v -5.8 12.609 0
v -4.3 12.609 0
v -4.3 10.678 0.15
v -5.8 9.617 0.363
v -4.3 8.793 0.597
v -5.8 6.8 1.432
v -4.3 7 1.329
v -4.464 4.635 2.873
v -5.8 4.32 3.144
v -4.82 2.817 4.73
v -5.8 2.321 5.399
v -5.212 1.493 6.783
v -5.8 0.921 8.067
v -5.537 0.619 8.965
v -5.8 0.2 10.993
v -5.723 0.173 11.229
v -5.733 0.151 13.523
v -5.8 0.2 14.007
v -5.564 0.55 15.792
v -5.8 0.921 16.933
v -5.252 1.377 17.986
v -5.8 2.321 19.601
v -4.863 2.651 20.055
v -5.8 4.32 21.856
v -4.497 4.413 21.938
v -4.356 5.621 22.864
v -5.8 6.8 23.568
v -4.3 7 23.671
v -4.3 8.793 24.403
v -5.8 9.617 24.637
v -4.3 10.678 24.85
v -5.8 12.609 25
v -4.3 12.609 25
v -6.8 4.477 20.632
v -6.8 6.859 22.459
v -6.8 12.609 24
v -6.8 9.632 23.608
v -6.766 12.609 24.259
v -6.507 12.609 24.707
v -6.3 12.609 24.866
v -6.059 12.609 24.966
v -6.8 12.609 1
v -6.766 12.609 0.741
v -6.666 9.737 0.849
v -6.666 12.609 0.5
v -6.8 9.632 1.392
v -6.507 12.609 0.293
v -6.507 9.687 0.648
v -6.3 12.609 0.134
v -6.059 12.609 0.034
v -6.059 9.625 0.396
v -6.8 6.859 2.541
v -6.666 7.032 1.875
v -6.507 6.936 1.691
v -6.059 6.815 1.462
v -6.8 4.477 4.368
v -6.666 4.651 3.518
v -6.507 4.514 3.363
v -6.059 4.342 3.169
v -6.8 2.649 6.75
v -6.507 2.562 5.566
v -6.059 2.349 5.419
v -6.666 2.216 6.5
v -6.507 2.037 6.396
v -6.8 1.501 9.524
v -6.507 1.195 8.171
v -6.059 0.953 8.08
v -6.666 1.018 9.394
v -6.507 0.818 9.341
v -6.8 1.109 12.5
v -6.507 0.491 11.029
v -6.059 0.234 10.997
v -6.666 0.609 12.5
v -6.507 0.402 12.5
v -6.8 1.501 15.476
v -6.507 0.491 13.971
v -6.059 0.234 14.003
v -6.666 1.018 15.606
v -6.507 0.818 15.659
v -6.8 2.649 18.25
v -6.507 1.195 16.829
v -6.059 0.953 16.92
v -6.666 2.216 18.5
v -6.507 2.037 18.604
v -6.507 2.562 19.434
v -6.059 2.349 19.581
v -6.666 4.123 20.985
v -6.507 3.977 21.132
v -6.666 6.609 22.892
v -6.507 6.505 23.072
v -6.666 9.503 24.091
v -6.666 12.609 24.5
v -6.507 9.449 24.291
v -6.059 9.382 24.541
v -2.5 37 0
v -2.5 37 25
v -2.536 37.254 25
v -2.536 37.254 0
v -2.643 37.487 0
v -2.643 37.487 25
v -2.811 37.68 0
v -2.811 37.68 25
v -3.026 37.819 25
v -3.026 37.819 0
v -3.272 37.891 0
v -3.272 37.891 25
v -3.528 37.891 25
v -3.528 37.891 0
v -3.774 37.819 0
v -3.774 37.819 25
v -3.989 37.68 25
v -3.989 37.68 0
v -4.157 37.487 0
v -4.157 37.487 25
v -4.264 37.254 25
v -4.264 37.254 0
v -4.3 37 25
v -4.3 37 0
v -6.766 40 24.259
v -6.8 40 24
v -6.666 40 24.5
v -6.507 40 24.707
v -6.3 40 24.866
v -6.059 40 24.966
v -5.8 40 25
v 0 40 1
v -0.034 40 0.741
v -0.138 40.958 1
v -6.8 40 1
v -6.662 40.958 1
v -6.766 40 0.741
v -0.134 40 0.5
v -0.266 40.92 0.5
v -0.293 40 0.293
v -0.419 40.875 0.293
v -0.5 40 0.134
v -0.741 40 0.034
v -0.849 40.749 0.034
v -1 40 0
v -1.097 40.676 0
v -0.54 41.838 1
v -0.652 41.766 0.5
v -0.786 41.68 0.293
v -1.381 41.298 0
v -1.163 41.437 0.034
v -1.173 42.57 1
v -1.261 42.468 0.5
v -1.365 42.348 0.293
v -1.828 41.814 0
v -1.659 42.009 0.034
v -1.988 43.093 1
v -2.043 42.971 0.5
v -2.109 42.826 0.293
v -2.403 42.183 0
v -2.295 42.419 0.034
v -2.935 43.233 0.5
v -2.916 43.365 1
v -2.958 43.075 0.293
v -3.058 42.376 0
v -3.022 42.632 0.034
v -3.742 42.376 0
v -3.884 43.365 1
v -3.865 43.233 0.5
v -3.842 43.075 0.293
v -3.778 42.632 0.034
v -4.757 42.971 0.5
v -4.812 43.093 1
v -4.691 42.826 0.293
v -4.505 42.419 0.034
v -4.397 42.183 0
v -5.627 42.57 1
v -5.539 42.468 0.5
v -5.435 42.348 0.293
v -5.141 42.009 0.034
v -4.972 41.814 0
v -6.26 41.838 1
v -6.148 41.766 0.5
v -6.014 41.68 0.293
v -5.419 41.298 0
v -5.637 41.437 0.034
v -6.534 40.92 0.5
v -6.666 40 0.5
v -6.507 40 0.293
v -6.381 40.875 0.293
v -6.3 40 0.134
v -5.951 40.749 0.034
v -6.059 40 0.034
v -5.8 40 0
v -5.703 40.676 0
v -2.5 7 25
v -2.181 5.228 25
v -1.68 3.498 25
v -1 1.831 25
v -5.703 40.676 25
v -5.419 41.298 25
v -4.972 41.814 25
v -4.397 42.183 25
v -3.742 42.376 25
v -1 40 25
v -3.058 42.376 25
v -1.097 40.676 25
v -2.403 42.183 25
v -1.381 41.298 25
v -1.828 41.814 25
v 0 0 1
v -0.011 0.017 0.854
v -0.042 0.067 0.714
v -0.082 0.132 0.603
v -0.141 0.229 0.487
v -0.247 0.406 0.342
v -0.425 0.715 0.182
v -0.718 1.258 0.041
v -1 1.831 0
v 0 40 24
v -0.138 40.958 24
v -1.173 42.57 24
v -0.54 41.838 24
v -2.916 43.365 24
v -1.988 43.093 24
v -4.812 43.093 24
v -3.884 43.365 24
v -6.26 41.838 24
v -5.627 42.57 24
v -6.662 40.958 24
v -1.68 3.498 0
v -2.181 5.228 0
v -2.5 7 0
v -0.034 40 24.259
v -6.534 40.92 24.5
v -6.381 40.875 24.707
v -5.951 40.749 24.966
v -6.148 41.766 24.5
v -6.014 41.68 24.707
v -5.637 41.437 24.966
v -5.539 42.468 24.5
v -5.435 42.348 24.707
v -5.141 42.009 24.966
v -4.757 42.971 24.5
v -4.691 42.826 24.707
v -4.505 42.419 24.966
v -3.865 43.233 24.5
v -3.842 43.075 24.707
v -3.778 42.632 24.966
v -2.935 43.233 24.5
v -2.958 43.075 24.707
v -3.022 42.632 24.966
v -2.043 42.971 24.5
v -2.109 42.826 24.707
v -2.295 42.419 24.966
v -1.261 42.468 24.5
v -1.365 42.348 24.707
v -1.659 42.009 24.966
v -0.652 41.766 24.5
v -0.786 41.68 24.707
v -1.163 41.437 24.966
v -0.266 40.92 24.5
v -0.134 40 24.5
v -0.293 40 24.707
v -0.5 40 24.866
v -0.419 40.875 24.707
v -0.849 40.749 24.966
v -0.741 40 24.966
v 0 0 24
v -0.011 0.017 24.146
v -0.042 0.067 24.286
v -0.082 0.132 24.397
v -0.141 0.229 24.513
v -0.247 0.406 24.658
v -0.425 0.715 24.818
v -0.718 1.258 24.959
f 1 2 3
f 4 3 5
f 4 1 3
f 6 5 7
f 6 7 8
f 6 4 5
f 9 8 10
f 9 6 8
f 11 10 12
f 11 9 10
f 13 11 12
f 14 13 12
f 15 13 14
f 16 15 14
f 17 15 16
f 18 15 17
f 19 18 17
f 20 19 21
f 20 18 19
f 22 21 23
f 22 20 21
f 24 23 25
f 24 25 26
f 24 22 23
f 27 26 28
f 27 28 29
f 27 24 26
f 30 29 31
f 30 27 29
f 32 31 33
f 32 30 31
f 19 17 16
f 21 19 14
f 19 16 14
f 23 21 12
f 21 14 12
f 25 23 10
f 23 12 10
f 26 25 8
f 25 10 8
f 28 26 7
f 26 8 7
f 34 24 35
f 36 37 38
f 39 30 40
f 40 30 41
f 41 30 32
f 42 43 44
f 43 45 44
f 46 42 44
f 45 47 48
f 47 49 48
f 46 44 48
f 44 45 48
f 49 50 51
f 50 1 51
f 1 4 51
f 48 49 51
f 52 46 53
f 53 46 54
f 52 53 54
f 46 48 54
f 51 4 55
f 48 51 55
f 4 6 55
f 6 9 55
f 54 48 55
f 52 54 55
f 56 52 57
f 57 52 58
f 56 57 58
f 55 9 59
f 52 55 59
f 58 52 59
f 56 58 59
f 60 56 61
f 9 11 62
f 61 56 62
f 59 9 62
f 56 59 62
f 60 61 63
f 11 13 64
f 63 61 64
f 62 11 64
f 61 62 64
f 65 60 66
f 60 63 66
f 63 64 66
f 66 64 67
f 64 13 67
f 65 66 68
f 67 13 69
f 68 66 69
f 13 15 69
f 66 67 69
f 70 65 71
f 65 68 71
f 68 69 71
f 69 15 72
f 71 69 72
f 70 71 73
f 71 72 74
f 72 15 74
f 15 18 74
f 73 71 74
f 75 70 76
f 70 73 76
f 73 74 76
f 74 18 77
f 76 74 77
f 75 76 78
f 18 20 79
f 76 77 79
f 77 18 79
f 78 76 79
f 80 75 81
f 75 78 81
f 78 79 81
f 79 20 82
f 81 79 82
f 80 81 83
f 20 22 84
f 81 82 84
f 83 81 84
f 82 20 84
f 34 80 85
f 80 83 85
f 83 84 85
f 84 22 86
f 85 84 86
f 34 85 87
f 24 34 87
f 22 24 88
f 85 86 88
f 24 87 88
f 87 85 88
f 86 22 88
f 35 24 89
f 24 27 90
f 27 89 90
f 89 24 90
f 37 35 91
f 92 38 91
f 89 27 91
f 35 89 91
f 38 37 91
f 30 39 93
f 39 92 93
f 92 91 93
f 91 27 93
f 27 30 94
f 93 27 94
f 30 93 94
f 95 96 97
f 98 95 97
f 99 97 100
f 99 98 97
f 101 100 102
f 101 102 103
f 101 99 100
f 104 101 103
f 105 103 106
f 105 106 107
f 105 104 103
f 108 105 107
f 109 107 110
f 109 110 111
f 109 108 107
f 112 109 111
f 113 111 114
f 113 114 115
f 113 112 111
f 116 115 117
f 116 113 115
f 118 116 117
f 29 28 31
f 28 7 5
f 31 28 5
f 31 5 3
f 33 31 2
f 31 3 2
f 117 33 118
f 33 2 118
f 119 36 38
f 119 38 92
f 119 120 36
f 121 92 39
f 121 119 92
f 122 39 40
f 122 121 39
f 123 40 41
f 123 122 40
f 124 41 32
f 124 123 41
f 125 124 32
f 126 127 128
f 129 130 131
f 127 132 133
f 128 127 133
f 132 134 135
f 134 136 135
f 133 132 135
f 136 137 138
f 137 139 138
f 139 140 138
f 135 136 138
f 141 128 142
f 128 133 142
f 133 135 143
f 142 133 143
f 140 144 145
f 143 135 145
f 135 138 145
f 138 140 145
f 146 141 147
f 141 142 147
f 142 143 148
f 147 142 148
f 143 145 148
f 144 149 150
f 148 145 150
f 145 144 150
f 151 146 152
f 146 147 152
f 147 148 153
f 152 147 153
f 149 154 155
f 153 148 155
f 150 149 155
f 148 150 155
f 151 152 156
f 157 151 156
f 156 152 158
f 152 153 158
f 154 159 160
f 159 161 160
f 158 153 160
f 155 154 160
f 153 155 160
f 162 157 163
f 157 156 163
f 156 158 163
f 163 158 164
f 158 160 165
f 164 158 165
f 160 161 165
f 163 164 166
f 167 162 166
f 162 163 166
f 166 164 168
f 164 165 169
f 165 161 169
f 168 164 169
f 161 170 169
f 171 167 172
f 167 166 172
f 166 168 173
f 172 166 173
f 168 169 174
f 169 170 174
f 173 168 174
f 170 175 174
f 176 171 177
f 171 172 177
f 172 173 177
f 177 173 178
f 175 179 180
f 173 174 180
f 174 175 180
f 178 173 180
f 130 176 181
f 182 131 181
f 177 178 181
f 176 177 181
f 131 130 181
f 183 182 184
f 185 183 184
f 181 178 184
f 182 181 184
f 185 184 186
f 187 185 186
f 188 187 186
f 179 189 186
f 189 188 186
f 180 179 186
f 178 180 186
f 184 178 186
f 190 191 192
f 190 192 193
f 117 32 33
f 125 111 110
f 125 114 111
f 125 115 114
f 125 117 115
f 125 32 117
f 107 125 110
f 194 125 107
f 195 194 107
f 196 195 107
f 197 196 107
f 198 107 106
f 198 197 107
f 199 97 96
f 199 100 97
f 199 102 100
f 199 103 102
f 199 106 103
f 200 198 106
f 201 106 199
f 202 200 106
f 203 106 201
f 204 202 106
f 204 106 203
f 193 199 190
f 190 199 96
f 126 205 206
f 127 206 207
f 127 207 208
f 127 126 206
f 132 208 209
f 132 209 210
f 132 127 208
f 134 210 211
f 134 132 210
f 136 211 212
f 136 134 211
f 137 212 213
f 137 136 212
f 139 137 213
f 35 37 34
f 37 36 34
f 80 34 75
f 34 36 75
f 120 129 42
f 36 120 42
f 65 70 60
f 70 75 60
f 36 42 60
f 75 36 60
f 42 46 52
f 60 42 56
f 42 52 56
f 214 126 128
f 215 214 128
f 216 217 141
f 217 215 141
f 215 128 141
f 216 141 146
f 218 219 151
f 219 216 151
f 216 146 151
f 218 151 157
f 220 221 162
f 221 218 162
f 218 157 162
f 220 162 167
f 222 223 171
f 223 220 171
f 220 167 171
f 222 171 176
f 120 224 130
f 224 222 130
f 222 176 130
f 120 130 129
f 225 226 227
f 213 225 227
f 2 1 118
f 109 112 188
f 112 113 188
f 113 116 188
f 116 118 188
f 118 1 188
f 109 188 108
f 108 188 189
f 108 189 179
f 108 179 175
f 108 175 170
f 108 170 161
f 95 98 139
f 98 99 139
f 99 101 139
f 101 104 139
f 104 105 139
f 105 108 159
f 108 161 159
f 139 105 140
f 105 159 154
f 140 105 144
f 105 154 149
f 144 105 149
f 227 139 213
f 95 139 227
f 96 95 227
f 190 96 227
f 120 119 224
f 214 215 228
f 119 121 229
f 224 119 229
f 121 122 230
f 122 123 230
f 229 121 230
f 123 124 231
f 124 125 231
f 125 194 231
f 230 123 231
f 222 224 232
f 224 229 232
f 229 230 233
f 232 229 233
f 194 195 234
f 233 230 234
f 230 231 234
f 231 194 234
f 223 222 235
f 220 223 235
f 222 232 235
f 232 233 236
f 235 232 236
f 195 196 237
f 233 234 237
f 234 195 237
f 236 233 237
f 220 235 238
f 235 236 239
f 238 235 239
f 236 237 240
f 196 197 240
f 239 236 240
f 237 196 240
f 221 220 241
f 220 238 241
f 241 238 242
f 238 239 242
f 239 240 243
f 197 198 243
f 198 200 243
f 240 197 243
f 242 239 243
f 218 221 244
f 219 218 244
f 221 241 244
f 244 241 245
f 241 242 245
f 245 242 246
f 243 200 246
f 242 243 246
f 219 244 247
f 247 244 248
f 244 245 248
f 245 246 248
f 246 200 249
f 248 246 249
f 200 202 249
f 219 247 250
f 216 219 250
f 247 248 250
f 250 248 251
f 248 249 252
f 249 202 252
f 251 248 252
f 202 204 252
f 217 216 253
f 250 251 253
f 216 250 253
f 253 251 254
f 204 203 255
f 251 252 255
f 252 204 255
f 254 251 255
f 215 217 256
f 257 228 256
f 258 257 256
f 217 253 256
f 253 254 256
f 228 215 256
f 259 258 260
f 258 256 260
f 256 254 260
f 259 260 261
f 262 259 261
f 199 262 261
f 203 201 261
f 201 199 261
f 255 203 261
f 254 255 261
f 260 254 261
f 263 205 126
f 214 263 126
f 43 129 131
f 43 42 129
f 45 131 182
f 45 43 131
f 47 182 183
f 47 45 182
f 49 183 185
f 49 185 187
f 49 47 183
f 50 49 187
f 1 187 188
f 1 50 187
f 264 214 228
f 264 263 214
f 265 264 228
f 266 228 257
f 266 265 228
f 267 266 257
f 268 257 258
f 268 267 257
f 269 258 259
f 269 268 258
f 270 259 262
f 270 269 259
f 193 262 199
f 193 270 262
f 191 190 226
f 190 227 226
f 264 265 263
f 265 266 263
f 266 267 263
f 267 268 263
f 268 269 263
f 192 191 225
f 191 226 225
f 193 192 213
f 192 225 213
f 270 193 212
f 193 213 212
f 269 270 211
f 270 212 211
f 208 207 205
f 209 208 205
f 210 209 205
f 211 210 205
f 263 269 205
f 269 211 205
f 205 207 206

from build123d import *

# Parameters (mm, degrees)
PAD_DEPTH    = 25
POCKET_DEPTH = 5
FILLET_R     = 1


with BuildPart() as part:
    # Sketch → Pad (new body)
    with BuildSketch(Plane.XY):
        with BuildLine():
            Line((-6.8, 40), (-6.8, 0))
            Line((-6.8, 0), (-5.8, 0))
            ThreePointArc((-5.8, 0), (-4.679209, 3.420545), (-4.3, 7))
            Line((-4.3, 7), (-4.3, 37))
            ThreePointArc((-2.5, 37), (-3.4, 37.9), (-4.3, 37))
            Line((-2.5, 37), (-2.5, 6.999997))
            ThreePointArc((-2.5, 6.999997), (-1.632155, 3.363514), (0, 0))
            Line((0, 0), (0, 40))
            ThreePointArc((0, 40), (-3.4, 43.4), (-6.8, 40))
        make_face()
    extrude(amount=PAD_DEPTH)

    # Sketch001 → Pocket (cut)
    with BuildSketch(Plane(origin=(-7.5, 0, 0), x_dir=(0, -1, 0), z_dir=(-1, 0, 0))):
        with BuildLine():
            ThreePointArc((-12.608682, 0), (-0.108682, 12.5), (-12.608682, 25))
            Line((-12.608682, 25), (7.391318, 25))
            Line((7.391318, 25), (7.391318, 0))
            Line((7.391318, 0), (-12.608682, 0))
        make_face()
    extrude(amount=-POCKET_DEPTH, mode=Mode.SUBTRACT)

    # Fillet
    fillet_edges = [part.edges().sort_by_distance(p)[0] for p in [
        (-6.8, 26.304341, 0),
        (-6.8, 0.108682, 12.5),
        (-6.8, 26.304341, 25),
        (-6.8, 40, 12.5),
    ]]
    fillet(fillet_edges, radius=FILLET_R)


solid = part.part
